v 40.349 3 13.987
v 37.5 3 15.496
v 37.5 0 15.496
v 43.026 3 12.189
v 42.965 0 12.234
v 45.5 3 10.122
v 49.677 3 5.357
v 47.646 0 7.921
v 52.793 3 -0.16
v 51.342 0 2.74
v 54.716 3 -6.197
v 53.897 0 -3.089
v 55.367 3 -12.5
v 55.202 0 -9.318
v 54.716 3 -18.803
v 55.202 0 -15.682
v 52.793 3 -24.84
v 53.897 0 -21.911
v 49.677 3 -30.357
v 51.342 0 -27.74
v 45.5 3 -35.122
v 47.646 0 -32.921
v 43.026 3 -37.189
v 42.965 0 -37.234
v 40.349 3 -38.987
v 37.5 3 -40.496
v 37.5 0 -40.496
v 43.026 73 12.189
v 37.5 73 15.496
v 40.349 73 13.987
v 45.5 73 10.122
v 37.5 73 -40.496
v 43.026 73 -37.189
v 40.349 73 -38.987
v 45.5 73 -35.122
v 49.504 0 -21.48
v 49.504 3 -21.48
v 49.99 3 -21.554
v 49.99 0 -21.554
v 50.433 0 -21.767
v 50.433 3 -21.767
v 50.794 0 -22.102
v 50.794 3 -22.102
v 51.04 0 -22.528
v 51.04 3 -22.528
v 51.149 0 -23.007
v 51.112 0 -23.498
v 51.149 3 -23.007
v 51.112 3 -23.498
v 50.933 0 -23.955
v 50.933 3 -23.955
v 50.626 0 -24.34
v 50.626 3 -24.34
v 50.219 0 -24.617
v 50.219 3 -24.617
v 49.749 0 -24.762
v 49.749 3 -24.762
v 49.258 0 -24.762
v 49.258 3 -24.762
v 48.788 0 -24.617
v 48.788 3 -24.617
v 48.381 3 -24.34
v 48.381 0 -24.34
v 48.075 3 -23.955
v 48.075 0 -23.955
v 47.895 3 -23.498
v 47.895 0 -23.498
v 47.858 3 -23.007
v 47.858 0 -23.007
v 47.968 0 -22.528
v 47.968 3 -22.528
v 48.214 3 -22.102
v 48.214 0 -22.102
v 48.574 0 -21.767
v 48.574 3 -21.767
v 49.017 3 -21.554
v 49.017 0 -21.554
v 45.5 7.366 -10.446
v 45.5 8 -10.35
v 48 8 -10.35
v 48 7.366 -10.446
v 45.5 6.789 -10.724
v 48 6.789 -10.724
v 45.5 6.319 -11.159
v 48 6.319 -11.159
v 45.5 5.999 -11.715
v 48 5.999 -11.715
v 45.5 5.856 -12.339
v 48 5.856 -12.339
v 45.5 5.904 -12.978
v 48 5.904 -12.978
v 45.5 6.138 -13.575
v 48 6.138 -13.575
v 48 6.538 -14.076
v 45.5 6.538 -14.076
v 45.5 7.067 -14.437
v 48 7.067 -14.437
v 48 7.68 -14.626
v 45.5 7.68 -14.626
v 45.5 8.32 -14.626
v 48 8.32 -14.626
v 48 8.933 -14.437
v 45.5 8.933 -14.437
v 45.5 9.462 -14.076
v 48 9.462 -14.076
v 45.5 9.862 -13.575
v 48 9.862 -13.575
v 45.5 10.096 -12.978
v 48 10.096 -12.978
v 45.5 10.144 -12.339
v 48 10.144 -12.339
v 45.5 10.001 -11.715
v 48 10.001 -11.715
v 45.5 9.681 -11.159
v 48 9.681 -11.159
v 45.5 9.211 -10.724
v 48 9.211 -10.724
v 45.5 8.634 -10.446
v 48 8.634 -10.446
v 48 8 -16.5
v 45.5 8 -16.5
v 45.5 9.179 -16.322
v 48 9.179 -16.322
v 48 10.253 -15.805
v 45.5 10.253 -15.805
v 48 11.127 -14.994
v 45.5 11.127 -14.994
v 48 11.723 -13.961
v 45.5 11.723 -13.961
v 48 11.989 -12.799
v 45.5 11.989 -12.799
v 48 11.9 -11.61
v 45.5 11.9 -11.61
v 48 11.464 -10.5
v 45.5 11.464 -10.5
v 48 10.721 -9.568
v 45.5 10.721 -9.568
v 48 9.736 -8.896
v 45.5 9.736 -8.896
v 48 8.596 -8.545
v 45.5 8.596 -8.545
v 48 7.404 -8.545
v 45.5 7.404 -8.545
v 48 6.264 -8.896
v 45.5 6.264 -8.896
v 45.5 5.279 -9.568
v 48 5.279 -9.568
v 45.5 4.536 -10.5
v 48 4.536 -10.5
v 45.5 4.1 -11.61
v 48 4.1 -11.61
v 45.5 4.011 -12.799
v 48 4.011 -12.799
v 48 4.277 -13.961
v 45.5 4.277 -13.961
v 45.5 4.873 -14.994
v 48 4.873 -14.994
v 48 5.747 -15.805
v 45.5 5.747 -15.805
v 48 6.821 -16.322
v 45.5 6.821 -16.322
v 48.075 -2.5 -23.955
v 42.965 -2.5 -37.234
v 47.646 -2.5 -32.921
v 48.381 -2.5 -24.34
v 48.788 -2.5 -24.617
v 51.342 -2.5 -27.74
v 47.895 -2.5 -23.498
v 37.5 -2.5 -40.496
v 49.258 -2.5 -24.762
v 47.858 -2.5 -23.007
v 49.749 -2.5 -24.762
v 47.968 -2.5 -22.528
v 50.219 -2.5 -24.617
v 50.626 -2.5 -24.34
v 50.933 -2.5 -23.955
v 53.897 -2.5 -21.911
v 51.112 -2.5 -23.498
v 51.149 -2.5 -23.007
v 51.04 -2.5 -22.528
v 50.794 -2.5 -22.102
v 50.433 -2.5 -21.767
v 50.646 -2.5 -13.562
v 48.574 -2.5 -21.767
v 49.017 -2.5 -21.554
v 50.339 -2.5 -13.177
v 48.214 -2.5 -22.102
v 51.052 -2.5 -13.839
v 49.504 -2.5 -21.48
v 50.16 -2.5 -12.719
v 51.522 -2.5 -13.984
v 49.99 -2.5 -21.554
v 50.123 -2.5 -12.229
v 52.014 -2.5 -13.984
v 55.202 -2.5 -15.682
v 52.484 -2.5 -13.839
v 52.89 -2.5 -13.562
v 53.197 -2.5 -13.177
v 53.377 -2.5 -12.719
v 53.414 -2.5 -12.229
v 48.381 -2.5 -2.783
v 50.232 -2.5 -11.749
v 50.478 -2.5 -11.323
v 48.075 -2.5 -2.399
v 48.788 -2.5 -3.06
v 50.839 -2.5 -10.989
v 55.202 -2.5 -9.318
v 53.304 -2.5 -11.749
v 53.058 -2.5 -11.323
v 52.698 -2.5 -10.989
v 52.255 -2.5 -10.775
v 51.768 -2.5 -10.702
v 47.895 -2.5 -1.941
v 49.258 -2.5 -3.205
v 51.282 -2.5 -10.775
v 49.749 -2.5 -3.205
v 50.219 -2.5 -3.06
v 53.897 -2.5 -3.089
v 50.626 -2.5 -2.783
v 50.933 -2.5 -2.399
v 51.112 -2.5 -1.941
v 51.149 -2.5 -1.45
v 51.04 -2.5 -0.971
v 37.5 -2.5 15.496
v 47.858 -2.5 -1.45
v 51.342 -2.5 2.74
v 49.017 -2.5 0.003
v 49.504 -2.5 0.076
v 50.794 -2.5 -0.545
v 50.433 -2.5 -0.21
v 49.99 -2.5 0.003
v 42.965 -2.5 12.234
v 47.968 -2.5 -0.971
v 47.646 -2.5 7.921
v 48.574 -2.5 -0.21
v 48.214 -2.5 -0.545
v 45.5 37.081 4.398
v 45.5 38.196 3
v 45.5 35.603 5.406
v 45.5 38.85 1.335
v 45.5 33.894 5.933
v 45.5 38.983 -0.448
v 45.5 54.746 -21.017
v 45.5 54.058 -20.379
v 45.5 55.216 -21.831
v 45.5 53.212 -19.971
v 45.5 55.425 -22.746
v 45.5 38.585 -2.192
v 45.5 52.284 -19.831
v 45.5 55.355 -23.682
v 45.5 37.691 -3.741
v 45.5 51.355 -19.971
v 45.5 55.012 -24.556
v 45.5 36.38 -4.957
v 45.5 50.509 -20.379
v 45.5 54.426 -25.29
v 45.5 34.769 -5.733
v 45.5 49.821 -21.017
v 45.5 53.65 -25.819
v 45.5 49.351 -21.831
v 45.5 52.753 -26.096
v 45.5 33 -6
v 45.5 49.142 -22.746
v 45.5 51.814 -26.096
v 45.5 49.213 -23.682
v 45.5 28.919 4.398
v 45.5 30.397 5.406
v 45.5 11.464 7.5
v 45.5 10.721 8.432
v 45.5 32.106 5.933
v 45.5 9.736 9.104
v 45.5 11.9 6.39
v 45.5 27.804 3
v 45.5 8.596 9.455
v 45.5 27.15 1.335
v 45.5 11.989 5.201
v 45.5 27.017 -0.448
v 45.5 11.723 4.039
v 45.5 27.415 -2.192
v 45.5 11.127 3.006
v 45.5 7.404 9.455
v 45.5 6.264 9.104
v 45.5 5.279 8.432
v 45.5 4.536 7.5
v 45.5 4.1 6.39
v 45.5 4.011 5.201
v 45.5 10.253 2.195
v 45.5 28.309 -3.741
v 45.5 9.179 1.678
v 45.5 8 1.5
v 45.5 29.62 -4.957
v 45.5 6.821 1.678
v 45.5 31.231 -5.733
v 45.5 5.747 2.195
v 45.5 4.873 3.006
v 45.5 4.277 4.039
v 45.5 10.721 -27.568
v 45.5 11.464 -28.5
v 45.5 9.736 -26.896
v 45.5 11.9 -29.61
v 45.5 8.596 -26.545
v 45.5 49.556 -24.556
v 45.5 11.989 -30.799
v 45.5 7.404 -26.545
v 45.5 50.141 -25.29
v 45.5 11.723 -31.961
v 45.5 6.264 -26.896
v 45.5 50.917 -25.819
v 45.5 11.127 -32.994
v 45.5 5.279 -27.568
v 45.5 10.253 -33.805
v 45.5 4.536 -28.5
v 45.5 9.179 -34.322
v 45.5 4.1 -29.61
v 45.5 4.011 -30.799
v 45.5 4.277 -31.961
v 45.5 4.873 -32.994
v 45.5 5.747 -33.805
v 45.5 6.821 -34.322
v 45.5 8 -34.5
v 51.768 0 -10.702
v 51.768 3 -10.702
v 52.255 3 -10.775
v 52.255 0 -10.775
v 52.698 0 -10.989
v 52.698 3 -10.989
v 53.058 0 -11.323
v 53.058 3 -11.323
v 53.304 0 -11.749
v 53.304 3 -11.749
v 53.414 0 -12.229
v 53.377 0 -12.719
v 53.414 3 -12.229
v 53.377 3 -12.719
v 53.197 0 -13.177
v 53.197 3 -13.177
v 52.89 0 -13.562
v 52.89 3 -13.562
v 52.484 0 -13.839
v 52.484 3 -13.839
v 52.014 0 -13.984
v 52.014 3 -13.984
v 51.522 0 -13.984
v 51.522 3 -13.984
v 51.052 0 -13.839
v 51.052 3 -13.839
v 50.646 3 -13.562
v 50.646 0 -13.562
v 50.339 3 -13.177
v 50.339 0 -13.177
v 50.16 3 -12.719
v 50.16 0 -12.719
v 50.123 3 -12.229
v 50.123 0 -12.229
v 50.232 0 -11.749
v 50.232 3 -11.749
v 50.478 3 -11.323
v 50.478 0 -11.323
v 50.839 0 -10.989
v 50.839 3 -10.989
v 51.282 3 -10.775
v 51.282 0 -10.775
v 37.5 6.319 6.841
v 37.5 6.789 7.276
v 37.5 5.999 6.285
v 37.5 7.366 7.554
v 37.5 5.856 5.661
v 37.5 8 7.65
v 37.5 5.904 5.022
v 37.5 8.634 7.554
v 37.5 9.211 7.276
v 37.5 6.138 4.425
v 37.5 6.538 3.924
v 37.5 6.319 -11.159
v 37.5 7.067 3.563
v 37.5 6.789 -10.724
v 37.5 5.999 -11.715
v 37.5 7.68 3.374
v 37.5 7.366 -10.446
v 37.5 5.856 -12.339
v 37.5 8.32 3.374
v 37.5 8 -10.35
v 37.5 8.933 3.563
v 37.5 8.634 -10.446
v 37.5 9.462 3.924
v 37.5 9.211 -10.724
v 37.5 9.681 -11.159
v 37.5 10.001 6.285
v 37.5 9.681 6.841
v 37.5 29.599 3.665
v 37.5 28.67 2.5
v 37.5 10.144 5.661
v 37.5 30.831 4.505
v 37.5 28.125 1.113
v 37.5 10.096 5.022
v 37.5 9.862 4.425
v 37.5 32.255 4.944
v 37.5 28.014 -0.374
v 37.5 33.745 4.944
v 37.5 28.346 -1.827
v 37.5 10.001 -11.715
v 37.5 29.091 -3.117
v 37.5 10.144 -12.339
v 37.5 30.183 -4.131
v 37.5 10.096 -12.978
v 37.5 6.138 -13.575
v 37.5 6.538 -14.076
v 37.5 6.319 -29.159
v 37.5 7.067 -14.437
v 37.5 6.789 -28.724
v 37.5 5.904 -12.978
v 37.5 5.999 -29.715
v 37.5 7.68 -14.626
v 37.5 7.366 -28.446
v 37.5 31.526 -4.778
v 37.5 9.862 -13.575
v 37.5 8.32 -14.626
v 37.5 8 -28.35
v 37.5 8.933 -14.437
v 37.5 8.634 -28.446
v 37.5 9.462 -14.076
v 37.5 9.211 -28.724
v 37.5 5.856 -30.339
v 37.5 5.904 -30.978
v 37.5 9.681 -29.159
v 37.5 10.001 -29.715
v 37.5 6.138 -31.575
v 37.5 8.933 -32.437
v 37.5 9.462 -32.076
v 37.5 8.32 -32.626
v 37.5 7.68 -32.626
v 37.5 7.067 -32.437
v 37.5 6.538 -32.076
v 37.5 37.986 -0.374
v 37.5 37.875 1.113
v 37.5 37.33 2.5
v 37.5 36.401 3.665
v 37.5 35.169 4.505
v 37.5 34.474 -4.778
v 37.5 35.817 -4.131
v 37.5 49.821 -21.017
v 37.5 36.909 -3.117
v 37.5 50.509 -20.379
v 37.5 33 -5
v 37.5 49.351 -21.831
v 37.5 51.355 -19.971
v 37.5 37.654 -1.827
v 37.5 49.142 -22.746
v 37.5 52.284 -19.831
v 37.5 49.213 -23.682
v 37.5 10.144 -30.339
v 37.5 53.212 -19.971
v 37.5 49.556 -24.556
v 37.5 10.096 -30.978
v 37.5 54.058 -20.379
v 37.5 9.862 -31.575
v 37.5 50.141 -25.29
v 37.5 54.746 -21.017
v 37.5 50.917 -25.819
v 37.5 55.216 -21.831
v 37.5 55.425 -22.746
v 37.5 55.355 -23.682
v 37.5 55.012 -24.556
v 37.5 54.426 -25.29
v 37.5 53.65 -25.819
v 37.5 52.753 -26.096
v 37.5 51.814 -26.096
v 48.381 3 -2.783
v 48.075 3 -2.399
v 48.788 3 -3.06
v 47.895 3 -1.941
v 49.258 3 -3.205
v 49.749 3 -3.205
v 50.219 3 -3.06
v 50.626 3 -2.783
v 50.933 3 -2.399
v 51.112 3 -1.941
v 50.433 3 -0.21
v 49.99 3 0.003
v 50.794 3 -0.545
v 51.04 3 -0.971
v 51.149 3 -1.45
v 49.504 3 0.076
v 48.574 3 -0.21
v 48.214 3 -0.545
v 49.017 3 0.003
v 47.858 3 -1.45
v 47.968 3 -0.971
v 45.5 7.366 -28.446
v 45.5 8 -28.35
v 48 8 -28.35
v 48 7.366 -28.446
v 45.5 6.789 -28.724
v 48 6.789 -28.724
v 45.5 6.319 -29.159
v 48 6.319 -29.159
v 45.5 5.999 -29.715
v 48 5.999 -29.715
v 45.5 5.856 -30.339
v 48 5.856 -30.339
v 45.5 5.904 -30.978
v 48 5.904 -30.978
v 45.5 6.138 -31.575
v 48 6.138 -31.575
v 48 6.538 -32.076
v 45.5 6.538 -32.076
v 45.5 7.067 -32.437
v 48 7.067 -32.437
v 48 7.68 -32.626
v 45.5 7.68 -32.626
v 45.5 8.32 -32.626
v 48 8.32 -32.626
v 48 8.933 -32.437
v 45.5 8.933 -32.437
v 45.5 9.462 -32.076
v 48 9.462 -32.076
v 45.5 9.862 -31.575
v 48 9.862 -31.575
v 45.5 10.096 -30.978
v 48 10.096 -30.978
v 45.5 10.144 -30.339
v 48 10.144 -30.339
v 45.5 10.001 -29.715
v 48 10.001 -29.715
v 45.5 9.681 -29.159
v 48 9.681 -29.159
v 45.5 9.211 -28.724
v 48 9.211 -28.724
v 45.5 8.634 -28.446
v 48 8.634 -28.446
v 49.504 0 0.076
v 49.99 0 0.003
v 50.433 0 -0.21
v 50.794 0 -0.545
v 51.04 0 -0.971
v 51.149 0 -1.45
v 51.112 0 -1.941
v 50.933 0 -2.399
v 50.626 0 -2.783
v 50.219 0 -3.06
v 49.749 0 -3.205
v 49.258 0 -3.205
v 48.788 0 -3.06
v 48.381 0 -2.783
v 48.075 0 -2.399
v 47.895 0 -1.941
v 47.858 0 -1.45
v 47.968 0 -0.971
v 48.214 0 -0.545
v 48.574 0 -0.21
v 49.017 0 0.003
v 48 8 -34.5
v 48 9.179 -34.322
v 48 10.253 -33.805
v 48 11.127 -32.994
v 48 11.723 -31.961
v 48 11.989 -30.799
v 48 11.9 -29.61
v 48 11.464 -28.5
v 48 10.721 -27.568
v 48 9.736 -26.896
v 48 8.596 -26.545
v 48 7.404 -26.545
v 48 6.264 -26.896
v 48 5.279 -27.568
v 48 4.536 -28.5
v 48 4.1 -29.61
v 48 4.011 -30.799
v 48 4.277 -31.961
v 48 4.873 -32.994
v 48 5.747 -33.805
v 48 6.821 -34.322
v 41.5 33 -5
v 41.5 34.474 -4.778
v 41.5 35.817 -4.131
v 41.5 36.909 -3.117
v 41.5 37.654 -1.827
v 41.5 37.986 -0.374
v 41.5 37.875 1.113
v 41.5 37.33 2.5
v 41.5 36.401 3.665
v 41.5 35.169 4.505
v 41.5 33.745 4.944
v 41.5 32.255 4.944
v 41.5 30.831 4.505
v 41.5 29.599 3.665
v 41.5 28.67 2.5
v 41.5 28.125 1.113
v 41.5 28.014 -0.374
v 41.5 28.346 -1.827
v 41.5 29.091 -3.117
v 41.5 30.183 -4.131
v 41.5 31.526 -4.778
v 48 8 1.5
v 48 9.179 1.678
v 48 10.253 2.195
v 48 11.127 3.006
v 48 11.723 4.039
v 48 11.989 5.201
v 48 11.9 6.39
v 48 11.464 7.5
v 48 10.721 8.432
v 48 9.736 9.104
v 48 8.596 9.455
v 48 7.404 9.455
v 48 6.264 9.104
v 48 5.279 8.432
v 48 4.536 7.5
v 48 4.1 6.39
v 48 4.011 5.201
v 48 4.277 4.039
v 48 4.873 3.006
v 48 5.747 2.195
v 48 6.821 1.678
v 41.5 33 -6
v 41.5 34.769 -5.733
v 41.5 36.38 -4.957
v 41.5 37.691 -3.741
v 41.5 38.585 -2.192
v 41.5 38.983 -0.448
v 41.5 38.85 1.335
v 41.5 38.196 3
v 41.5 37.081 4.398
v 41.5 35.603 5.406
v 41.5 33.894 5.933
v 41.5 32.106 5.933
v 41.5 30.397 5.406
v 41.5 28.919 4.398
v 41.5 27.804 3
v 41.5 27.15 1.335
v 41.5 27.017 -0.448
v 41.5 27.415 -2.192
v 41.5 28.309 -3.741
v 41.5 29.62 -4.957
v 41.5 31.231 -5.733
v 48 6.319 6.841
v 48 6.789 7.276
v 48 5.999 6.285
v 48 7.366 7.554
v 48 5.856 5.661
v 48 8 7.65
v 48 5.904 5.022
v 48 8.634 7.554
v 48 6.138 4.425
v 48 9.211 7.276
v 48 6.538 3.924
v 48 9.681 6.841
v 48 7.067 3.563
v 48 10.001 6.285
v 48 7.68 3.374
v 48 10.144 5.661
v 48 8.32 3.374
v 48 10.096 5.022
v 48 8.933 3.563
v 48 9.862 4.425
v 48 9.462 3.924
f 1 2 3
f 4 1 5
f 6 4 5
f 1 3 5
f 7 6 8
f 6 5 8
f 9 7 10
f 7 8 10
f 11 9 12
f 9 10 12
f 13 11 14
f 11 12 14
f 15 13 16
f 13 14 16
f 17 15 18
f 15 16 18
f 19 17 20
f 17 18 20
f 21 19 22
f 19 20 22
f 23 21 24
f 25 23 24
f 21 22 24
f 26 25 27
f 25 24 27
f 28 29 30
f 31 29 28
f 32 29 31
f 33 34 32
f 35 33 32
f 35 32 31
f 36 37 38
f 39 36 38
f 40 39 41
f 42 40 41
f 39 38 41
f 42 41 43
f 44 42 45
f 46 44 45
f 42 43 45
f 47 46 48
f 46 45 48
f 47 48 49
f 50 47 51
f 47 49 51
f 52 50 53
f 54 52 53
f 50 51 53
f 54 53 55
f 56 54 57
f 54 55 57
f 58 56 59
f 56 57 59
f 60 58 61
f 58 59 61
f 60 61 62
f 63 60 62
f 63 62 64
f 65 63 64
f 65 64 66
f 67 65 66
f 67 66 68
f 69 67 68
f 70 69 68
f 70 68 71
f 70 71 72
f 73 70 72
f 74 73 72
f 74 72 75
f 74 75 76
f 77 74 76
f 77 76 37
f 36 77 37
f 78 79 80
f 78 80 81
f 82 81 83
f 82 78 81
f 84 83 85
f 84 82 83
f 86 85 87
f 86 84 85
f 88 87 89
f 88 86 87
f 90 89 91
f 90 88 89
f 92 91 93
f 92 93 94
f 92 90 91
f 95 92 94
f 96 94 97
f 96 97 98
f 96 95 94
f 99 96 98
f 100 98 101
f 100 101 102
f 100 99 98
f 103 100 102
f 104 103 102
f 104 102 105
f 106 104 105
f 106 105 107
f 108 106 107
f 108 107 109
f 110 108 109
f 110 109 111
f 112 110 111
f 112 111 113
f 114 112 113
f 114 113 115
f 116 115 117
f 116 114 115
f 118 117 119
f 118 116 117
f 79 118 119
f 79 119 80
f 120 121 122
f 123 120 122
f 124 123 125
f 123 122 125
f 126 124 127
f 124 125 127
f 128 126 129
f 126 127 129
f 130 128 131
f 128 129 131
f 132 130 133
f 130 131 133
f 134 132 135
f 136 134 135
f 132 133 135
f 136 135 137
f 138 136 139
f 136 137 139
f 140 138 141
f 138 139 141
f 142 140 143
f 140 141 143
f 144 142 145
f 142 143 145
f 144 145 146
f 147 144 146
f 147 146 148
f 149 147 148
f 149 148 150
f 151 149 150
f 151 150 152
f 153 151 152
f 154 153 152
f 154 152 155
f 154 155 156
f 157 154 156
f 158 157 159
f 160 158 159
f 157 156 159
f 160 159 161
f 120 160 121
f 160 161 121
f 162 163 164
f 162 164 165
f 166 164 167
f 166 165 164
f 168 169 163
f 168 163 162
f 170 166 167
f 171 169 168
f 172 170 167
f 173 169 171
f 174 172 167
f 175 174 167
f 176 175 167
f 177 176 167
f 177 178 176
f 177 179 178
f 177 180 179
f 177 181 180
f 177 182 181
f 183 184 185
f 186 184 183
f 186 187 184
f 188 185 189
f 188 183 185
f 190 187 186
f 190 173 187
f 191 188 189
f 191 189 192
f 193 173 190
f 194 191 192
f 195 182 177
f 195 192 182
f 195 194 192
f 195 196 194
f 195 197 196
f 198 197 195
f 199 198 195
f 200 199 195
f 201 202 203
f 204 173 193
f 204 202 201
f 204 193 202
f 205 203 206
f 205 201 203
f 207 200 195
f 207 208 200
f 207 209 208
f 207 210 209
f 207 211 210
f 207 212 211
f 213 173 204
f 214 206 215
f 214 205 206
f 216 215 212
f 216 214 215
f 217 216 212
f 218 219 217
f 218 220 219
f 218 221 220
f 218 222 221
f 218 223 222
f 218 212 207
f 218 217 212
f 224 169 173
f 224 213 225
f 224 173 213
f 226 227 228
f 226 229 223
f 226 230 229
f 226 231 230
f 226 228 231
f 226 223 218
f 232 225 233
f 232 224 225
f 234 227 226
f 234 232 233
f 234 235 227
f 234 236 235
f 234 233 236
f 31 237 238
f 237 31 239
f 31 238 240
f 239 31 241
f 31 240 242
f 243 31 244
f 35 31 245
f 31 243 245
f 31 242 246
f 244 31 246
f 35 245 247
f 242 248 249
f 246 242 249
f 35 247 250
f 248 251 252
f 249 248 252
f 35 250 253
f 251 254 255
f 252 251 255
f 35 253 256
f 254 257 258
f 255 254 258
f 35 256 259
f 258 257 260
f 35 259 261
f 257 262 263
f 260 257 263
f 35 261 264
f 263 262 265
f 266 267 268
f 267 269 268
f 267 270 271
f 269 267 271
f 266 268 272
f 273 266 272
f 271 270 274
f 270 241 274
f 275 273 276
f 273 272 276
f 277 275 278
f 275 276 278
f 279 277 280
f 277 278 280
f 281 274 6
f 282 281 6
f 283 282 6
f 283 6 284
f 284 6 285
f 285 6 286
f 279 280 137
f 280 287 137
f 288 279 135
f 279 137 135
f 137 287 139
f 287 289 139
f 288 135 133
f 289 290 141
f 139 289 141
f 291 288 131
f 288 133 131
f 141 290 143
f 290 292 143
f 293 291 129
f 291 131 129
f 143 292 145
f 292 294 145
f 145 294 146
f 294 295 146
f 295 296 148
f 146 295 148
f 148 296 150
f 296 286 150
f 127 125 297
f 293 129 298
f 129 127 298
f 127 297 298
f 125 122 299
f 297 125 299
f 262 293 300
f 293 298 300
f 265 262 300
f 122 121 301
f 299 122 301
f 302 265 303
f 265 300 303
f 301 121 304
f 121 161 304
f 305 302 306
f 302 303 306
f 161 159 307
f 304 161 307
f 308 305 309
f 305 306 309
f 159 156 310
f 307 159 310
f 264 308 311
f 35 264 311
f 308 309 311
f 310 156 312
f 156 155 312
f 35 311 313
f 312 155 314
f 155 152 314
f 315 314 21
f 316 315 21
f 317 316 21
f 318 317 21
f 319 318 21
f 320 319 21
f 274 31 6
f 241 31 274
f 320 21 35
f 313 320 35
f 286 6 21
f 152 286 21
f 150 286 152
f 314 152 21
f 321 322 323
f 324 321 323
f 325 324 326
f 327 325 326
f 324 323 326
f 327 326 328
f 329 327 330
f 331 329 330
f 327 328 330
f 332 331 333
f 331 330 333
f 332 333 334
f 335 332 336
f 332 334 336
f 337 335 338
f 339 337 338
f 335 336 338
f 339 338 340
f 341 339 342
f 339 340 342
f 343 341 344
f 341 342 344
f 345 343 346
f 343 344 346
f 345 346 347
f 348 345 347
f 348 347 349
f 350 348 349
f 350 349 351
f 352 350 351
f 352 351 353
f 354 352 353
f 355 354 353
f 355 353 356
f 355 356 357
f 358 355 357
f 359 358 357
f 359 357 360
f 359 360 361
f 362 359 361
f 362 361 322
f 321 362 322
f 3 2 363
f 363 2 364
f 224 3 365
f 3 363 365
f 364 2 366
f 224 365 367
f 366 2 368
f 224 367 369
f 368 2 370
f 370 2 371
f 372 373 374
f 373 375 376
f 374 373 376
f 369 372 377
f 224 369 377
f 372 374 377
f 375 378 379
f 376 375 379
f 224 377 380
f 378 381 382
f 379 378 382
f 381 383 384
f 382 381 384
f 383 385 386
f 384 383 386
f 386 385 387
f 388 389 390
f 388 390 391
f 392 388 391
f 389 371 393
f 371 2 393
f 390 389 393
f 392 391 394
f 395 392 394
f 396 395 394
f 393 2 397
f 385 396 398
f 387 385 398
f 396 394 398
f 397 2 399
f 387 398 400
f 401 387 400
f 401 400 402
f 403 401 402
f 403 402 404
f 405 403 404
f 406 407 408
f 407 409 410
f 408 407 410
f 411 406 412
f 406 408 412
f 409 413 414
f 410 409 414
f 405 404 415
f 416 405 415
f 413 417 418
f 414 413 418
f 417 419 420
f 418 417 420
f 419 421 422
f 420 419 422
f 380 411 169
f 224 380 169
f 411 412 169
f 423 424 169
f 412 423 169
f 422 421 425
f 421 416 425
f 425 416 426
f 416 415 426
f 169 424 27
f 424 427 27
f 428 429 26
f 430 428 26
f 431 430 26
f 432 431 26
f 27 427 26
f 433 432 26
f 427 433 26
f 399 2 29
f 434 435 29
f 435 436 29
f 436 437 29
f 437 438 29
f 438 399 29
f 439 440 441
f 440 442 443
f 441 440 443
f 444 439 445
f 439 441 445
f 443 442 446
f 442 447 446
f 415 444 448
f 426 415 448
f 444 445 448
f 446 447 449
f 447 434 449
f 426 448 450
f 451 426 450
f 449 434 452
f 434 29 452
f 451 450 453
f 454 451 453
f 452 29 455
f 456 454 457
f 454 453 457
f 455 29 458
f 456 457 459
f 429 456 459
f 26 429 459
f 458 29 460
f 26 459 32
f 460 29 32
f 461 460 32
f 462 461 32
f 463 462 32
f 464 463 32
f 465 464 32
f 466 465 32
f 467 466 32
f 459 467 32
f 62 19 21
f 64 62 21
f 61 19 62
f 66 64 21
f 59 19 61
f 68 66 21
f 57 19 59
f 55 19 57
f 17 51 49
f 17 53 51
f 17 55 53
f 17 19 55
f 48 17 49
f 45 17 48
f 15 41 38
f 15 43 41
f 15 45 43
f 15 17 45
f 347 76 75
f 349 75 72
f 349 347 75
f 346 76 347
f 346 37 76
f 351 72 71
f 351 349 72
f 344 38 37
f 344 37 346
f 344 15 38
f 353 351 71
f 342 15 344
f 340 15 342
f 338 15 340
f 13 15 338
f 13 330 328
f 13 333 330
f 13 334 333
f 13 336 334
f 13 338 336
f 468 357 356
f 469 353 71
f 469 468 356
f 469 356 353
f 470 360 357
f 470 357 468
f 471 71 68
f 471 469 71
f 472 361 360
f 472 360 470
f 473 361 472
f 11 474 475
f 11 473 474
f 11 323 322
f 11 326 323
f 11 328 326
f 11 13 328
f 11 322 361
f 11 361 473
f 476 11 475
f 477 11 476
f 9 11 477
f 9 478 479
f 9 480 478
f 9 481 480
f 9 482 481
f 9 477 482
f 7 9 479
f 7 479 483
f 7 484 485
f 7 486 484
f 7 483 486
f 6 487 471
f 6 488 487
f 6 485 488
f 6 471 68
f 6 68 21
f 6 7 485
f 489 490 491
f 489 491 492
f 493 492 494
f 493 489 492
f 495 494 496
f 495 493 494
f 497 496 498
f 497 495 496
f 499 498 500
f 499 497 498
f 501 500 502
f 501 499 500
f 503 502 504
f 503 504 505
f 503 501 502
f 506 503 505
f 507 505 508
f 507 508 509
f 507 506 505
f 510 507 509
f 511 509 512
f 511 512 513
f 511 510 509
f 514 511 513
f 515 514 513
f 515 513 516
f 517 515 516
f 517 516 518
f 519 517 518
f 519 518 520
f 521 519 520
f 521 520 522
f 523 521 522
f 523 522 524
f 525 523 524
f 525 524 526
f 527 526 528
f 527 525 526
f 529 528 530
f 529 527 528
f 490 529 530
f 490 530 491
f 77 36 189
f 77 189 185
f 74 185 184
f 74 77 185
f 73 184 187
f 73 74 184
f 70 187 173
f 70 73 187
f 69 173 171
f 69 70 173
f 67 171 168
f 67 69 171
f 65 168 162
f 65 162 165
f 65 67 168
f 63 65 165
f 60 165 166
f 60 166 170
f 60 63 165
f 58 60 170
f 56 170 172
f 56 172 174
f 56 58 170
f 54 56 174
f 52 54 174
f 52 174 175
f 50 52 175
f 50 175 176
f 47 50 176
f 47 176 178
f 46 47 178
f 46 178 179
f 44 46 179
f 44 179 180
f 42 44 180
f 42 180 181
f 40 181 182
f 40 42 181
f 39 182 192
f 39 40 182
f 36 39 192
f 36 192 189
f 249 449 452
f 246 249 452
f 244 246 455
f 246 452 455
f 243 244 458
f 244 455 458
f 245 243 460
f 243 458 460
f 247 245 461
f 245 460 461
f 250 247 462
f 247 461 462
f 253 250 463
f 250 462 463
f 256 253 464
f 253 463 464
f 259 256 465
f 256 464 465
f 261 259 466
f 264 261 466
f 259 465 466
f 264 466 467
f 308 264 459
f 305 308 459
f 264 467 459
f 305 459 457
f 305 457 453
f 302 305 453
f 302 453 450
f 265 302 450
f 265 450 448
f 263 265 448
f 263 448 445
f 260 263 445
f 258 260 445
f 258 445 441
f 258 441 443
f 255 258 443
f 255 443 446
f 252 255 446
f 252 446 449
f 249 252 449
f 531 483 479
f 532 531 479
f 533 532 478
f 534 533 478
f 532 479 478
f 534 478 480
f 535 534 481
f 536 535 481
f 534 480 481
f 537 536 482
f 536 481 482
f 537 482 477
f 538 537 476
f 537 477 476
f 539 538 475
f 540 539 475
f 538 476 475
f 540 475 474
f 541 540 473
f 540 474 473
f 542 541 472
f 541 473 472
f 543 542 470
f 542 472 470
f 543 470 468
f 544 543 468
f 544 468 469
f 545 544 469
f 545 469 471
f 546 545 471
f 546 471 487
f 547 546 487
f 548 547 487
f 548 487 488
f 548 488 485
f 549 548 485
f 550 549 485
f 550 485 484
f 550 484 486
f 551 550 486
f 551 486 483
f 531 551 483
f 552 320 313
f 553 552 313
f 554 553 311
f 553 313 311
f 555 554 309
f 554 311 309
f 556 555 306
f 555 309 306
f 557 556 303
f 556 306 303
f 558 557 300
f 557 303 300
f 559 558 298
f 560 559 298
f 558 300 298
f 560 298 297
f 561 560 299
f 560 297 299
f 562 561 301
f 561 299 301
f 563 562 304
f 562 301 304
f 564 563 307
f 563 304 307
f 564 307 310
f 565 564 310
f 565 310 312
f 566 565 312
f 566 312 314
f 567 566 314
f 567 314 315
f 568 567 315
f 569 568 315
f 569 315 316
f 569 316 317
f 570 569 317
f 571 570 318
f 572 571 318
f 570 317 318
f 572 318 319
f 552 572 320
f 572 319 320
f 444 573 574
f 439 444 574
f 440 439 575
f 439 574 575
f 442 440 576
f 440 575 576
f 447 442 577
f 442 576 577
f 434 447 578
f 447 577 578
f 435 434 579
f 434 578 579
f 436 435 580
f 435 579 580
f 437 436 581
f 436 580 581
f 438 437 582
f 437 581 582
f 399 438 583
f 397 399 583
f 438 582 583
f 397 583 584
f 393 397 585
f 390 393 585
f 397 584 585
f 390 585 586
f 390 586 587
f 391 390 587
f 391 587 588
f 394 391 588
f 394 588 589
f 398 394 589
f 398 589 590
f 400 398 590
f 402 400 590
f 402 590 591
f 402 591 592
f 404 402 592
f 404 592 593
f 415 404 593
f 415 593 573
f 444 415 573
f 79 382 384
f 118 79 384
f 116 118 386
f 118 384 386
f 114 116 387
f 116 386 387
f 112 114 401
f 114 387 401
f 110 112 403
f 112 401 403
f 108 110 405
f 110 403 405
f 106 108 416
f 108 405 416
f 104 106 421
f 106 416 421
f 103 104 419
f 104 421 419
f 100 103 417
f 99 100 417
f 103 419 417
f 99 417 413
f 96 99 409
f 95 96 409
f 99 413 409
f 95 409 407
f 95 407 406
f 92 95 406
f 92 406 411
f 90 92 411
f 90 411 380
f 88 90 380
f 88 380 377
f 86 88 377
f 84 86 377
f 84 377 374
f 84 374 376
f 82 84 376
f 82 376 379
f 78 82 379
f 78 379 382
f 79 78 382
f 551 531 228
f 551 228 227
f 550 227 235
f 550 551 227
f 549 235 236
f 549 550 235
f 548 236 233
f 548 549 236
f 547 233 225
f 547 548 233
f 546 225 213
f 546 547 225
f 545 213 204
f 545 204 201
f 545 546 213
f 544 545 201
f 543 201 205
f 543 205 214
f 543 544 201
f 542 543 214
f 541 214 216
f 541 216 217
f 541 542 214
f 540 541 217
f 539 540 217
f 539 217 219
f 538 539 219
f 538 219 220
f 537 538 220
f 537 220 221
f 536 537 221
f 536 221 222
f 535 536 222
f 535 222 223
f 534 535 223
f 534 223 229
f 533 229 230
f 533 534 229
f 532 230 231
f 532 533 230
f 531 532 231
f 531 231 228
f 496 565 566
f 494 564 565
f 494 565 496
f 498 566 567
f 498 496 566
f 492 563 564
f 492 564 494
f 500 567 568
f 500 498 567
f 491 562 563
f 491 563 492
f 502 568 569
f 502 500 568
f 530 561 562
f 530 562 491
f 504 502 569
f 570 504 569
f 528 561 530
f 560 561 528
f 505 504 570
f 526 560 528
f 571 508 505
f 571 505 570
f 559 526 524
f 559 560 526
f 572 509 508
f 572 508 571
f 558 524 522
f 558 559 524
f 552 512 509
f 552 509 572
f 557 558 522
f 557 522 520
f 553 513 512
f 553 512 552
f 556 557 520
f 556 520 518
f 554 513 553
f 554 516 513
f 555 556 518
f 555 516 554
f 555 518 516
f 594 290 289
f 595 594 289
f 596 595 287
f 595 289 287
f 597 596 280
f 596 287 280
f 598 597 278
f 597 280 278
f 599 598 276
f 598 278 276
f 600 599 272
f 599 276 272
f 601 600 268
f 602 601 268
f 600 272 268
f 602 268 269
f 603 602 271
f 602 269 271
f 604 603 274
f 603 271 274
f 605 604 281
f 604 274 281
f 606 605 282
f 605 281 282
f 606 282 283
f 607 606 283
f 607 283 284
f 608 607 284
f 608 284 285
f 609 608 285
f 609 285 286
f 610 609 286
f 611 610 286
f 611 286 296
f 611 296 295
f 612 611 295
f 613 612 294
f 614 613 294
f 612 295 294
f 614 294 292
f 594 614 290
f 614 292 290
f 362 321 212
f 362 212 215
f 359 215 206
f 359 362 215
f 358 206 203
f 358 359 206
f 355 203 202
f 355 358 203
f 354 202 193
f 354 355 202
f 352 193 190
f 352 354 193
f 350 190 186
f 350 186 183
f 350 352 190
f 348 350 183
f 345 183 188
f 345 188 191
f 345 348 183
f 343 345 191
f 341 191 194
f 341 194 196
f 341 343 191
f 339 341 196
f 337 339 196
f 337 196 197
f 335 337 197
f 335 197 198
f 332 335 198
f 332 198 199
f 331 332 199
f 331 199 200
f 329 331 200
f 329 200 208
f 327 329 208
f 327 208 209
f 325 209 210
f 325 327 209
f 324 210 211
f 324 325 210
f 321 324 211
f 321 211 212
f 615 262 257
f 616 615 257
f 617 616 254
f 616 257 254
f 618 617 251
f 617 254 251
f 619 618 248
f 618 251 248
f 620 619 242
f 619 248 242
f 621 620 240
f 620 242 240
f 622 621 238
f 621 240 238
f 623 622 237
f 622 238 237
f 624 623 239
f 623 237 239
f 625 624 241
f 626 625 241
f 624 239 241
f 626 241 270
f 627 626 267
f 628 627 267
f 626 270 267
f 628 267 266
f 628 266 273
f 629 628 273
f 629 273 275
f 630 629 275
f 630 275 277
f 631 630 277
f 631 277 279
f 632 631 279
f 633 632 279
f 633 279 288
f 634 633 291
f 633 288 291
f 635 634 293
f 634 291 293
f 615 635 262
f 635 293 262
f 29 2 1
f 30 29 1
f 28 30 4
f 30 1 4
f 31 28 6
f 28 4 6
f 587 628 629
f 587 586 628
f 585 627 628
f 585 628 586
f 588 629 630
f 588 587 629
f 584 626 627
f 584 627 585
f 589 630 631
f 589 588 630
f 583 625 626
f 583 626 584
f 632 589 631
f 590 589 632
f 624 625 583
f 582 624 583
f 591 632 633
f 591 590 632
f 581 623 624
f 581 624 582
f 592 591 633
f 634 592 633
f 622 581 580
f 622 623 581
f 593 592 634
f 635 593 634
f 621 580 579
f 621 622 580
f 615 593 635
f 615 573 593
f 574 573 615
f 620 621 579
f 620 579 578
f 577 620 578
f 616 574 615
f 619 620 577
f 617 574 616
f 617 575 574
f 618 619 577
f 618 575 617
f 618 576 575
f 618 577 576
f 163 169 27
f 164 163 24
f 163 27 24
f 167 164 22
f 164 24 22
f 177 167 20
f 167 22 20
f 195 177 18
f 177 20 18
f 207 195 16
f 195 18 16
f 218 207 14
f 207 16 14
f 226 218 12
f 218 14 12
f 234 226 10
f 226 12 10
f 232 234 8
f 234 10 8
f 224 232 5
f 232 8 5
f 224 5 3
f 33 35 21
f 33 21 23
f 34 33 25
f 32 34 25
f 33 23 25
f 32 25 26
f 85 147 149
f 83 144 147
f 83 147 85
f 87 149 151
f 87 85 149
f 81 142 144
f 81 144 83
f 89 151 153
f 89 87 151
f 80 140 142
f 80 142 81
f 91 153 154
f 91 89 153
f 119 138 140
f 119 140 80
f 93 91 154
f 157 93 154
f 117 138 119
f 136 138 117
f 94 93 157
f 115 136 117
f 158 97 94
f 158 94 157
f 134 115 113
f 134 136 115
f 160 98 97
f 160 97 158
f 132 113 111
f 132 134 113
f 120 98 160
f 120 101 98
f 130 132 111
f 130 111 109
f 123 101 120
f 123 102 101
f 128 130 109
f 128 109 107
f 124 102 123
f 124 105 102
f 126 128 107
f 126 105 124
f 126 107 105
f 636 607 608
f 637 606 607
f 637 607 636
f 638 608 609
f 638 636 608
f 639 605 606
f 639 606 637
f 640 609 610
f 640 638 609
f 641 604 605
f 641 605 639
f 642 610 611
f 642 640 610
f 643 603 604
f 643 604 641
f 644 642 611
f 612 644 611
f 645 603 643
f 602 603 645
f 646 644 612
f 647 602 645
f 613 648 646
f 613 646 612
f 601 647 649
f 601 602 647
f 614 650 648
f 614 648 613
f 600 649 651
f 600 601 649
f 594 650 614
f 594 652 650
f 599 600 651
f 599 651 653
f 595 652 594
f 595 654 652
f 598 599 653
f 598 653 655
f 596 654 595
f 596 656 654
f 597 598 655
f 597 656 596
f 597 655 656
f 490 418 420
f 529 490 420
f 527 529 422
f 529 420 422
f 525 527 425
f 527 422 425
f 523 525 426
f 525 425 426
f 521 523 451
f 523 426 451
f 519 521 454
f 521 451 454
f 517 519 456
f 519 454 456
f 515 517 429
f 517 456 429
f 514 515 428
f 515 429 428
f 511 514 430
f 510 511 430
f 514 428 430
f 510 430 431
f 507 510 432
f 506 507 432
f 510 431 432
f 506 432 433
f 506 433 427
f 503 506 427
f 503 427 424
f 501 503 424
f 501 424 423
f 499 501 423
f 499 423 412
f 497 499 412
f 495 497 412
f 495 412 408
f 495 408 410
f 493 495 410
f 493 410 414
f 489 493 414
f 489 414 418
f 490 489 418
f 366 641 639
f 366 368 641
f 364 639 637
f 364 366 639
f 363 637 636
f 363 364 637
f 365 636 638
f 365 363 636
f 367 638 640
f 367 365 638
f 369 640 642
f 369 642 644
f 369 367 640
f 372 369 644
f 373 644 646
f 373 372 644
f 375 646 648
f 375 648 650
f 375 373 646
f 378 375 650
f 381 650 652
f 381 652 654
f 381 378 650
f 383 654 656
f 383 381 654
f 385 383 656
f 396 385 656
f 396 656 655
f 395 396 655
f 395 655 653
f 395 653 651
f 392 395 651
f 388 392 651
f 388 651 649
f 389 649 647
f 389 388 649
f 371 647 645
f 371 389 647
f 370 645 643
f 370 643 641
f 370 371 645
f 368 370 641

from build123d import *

# Parameters (mm, degrees)
SKETCH1_R                = 28
BOSS_EXTRUDE1_DEPTH      = 3
SKETCH2_R                = 1.625
CUT_EXTRUDE1_DEPTH       = 3
BOSS_EXTRUDE4_START      = 3
BOSS_EXTRUDE4_OUTLINE_R  = 1.625
BOSS_EXTRUDE4_DEPTH      = 70
BOSS_EXTRUDE6_DEPTH      = 7
CUT_EXTRUDE13_START      = -10
CUT_EXTRUDE13_DEPTH      = 10
SKETCH14_R               = 6
CUT_EXTRUDE7_DEPTH       = 4
SKETCH15_R               = 5
CUT_EXTRUDE8_DEPTH       = 37
SKETCH17_R               = 2.15
CUT_EXTRUDE10_DEPTH      = 15.8
CUT_EXTRUDE11_DEPTH      = 5
CUT_EXTRUDE12_START      = -3
CUT_EXTRUDE12_DEPTH      = 3
SKETCH21_W               = 20.621892052
SKETCH21_H               = 10
BOSS_EXTRUDE7_DEPTH      = 7
SKETCH23_R               = 2.15
CUT_EXTRUDE17_DEPTH      = 23
SKETCH25_W               = 2
SKETCH25_H               = 4.7
CUT_EXTRUDE19_DEPTH      = 5
SKETCH26_W               = 20.621892052
SKETCH26_H               = 58
CUT_EXTRUDE21_DEPTH      = 5
CUT_EXTRUDE22_DEPTH      = 5
SKETCH41_R               = 1.625
CUT_EXTRUDE23_DEPTH      = 70
CUT_EXTRUDE24_START      = -39
CUT_EXTRUDE24_DEPTH      = 39
BOSS_EXTRUDE12_START     = -3
SKETCH43_R               = 30.866648668
BOSS_EXTRUDE12_DEPTH     = 3
BOSS_EXTRUDE13_DEPTH     = 70
BOSS_EXTRUDE14_DEPTH     = 70
SKETCH47_R               = 1.625
SKETCH47_R_2             = 1.65
CUT_EXTRUDE26_DEPTH      = 39
SKETCH48_R               = 3.15
CUT_EXTRUDE27_DEPTH      = 39
SKETCH49_R               = 5
CUT_EXTRUDE28_DEPTH      = 10
SKETCH50_R               = 6
CUT_EXTRUDE29_DEPTH      = 4
SKETCH51_R               = 3
CUT_EXTRUDE30_DEPTH      = 2.5
CUT_EXTRUDE31_DEPTH      = 82
CUT_EXTRUDE31_DEPTH_BACK = 10
SKETCH53_R               = 2.15
CUT_EXTRUDE32_DEPTH      = 10
SKETCH54_R               = 4
SKETCH54_R_2             = 2.15
BOSS_EXTRUDE15_DEPTH     = 2.5
SKETCH55_R               = 1.65
BOSS_EXTRUDE16_DEPTH     = 2.5


# Read off the part's stored shape, not the designer's step: Boss-Extrude4, Cut-Extrude13
with BuildPart() as part:
    # Sketch1 → Boss-Extrude1 (new body)
    with BuildSketch(Plane(origin=(0, 0, 0), x_dir=(1, 0, 0), z_dir=(0, 1, 0))):
        with Locations(Location((20, 12.5, 0), (0, 0, 270))):
            Circle(SKETCH1_R)
    extrude(amount=BOSS_EXTRUDE1_DEPTH)

    # Sketch2 → Cut-Extrude1 (cut)
    with BuildSketch(Plane(origin=(0, 3, 0), x_dir=(1, 0, 0), z_dir=(0, 1, 0))):
        with Locations(Location((20, 19.5, 0), (0, 0, 270))):
            Circle(SKETCH2_R)
        with Locations(Location((20, 5.5, 0), (0, 0, 270))):
            Circle(SKETCH2_R)
        with Locations(Location((20, 12.5, 0), (0, 0, 270))):
            Circle(SKETCH2_R)
    extrude(amount=-CUT_EXTRUDE1_DEPTH, mode=Mode.SUBTRACT)

    # Boss-Extrude4 outline → Boss-Extrude4 (add)
    with BuildSketch(Plane(origin=(0, 0, 0), x_dir=(1, 0, 0), z_dir=(0, 1, 0)).offset(BOSS_EXTRUDE4_START)):
        with BuildLine():
            ThreePointArc((3.5, -10.121892052), (48, 12.5), (3.5, 35.121892052))
            Line((3.5, 35.121892052), (3.5, -10.121892052))
        make_face()
        with Locations((20, 5.5)):
            Circle(BOSS_EXTRUDE4_OUTLINE_R, mode=Mode.SUBTRACT)
        with Locations((20, 12.5)):
            Circle(BOSS_EXTRUDE4_OUTLINE_R, mode=Mode.SUBTRACT)
        with Locations((20, 19.5)):
            Circle(BOSS_EXTRUDE4_OUTLINE_R, mode=Mode.SUBTRACT)
    extrude(amount=BOSS_EXTRUDE4_DEPTH)

    # Sketch13 → Boss-Extrude6 (add)
    with BuildSketch(Plane.ZY.offset(-3.5)):
        Polygon((-10, 23), (10, 23), (10.121892052, 23), (10.121892052, 15), (10, 15), (-10, 15), (-10.5, 15), (-10.5, 23), align=None)
    extrude(amount=BOSS_EXTRUDE6_DEPTH)

    # Cut-Extrude13 outline → Cut-Extrude13 (cut)
    with BuildSketch(Plane.ZY.offset(-3.5).offset(CUT_EXTRUDE13_START)):
        with BuildLine():
            Line((-10.5, 33), (-10.5, 23))
            Line((-10.5, 23), (10.121892052, 23))
            Line((10.121892052, 23), (10.121892052, 35.792364821))
            ThreePointArc((10.121892052, 35.792364821), (-1.408923961, 43.405043646), (-10.5, 33))
        make_face()
    extrude(amount=CUT_EXTRUDE13_DEPTH, mode=Mode.SUBTRACT)

    # Sketch14 → Cut-Extrude7 (cut)
    with BuildSketch(Plane.ZY.offset(-3.5)):
        with Locations((-22.981333294, 52.283628291)):
            Circle(SKETCH14_R)
    extrude(amount=-CUT_EXTRUDE7_DEPTH, mode=Mode.SUBTRACT)

    # Sketch15 → Cut-Extrude8 (cut)
    with BuildSketch(Plane.ZY.offset(-7.5)):
        with Locations((-22.981333294, 52.283628291)):
            Circle(SKETCH15_R)
    extrude(amount=-CUT_EXTRUDE8_DEPTH, mode=Mode.SUBTRACT)

    # Sketch17 → Cut-Extrude10 (cut)
    with BuildSketch(Plane.ZY.offset(3.5)):
        with Locations((-5, 18.2)):
            Circle(SKETCH17_R)
        with Locations((5, 18.2)):
            Circle(SKETCH17_R)
    extrude(amount=-CUT_EXTRUDE10_DEPTH, mode=Mode.SUBTRACT)

    # Sketch18 → Cut-Extrude11 (cut)
    with BuildSketch(Plane.ZY.offset(3.5)):
        Polygon((-0.189053974, 23), (1, 23), (1, 18), (-1, 18), (-1, 23), align=None)
    extrude(amount=-CUT_EXTRUDE11_DEPTH, mode=Mode.SUBTRACT)

    # Sketch19 → Cut-Extrude12 (cut)
    with BuildSketch(Plane.ZY.offset(-3.5).offset(CUT_EXTRUDE12_START)):
        with BuildLine():
            Line((10.121892052, 63), (10.121892052, 35.792364821))
            ThreePointArc((10.121892052, 35.792364821), (-1.408923961, 43.405043646), (-10.5, 33))
            Line((-10.5, 33), (-10.5, 62))
            Line((-10.5, 62), (-10.5, 63))
            Line((-10.5, 63), (10.121892052, 63))
        make_face()
    extrude(amount=CUT_EXTRUDE12_DEPTH, mode=Mode.SUBTRACT)

    # Sketch21 → Boss-Extrude7 (add)
    with BuildSketch(Plane.ZY.offset(-3.5)):
        with Locations((-0.189053974, 68)):
            Rectangle(SKETCH21_W, SKETCH21_H)
    extrude(amount=BOSS_EXTRUDE7_DEPTH)

    # Sketch23 → Cut-Extrude17 (cut)
    with BuildSketch(Plane.ZY.offset(3.5)):
        with Locations((-5, 67.7)):
            Circle(SKETCH23_R)
        with Locations((5, 67.7)):
            Circle(SKETCH23_R)
    extrude(amount=-CUT_EXTRUDE17_DEPTH, mode=Mode.SUBTRACT)

    # Sketch25 → Cut-Extrude19 (cut)
    with BuildSketch(Plane.ZY.offset(3.5)):
        with Locations((0, 65.35)):
            Rectangle(SKETCH25_W, SKETCH25_H)
    extrude(amount=-CUT_EXTRUDE19_DEPTH, mode=Mode.SUBTRACT)

    # Sketch26 → Cut-Extrude21 (cut)
    with BuildSketch(Plane.ZY.offset(3.5)):
        with Locations((-0.189053974, 44)):
            Rectangle(SKETCH26_W, SKETCH26_H)
    extrude(amount=-CUT_EXTRUDE21_DEPTH, mode=Mode.SUBTRACT)

    # Sketch27 → Cut-Extrude22 (cut)
    with BuildSketch(Plane.ZY.offset(-6.5)):
        Polygon((10.121892052, 63), (-10.5, 63), (-10.5, 33), (10.121892052, 35.792364821), align=None)
    extrude(amount=-CUT_EXTRUDE22_DEPTH, mode=Mode.SUBTRACT)

    # Sketch41 → Cut-Extrude23 (cut)
    with BuildSketch(Plane(origin=(0, 73, 0), x_dir=(1, 0, 0), z_dir=(0, 1, 0))):
        with BuildLine():
            Line((11.5, 39.178643144), (11.5, 10.5))
            Line((11.5, 10.5), (11.5, -14.178643144))
            ThreePointArc((11.5, -14.178643144), (48, 12.5), (11.5, 39.178643144))
        make_face()
        with Locations(Location((20, 5.5, 0), (0, 0, 270))):
            Circle(SKETCH41_R, mode=Mode.SUBTRACT)
        with Locations(Location((20, 12.5, 0), (0, 0, 270))):
            Circle(SKETCH41_R, mode=Mode.SUBTRACT)
        with Locations(Location((20, 19.5, 0), (0, 0, 270))):
            Circle(SKETCH41_R, mode=Mode.SUBTRACT)
    extrude(amount=-CUT_EXTRUDE23_DEPTH, mode=Mode.SUBTRACT)

    # Sketch42 → Cut-Extrude24 (cut)
    with BuildSketch(Plane(origin=(0, 3, 0), x_dir=(1, 0, 0), z_dir=(0, 1, 0)).offset(CUT_EXTRUDE24_START)):
        with BuildLine():
            ThreePointArc((3.5, 35.121892052), (-6.366648668, 12.5), (3.5, -10.121892052))
            ThreePointArc((3.5, -10.121892052), (-8, 12.5), (3.5, 35.121892052))
        make_face()
    extrude(amount=CUT_EXTRUDE24_DEPTH, mode=Mode.SUBTRACT)

    # Sketch43 → Boss-Extrude12 (add)
    with BuildSketch(Plane(origin=(0, 3, 0), x_dir=(1, 0, 0), z_dir=(0, 1, 0)).offset(BOSS_EXTRUDE12_START)):
        with Locations(Location((24.5, 12.5, 0), (0, 0, 270))):
            Circle(SKETCH43_R)
    extrude(amount=BOSS_EXTRUDE12_DEPTH)

    # Sketch45 → Boss-Extrude13 (add)
    with BuildSketch(Plane(origin=(0, 3, 0), x_dir=(1, 0, 0), z_dir=(0, 1, 0))):
        with BuildLine():
            Line((11.5, 40.495535358), (11.5, 39.178643144))
            ThreePointArc((11.5, 39.178643144), (7.336497035, 37.472698946), (3.5, 35.121892052))
            ThreePointArc((3.5, 35.121892052), (7.288985777, 38.12286068), (11.5, 40.495535358))
        make_face()
        with BuildLine():
            Line((11.5, -14.178643144), (11.5, -15.495535358))
            ThreePointArc((11.5, -15.495535358), (7.288985777, -13.12286068), (3.5, -10.121892052))
            ThreePointArc((3.5, -10.121892052), (7.336497035, -12.472698946), (11.5, -14.178643144))
        make_face()
    extrude(amount=BOSS_EXTRUDE13_DEPTH)

    # Sketch46 → Boss-Extrude14 (add)
    with BuildSketch(Plane(origin=(0, 3, 0), x_dir=(1, 0, 0), z_dir=(0, 1, 0))):
        with BuildLine():
            Line((37.5, 40.495535358), (37.5, 12.5))
            Line((37.5, 12.5), (37.5, -15.495535358))
            ThreePointArc((37.5, -15.495535358), (41.711014223, -13.12286068), (45.5, -10.121892052))
            Line((45.5, -10.121892052), (45.5, 12.5))
            Line((45.5, 12.5), (45.5, 35.121892052))
            ThreePointArc((45.5, 35.121892052), (41.711014223, 38.12286068), (37.5, 40.495535358))
        make_face()
    extrude(amount=BOSS_EXTRUDE14_DEPTH)

    # Sketch47 → Cut-Extrude26 (cut)
    with BuildSketch(Plane(origin=(0, 3, 0), x_dir=(1, 0, 0), z_dir=(0, 1, 0))):
        with Locations(Location((24.638783134, 19.352080003, 0), (0, 0, 270))):
            Circle(SKETCH47_R)
        with Locations(Location((24.638783134, 12.352080003, 0), (0, 0, 270))):
            Circle(SKETCH47_R)
        with Locations(Location((24.638783134, -15.204594071, 0), (0, 0, 270))):
            Circle(SKETCH47_R)
        with Locations(Location((0.774003343, -1.426257034, 0), (0, 0, 270))):
            Circle(SKETCH47_R)
        with Locations(Location((0.774003343, 26.13041704, 0), (0, 0, 270))):
            Circle(SKETCH47_R)
        with Locations(Location((24.638783134, 39.908754076, 0), (0, 0, 270))):
            Circle(SKETCH47_R)
        with Locations(Location((30.700960961, 15.852080003, 0), (0, 0, 270))):
            Circle(SKETCH47_R)
        with Locations(Location((-2.490624188, 12.352080003, 0), (0, 0, 270))):
            Circle(SKETCH47_R)
        with Locations(Location((51.768190456, 12.352080003, 0), (0, 0, 270))):
            Circle(SKETCH47_R_2)
        with Locations(Location((24.638783134, 26.13041704, 0), (0, 0, 270))):
            Circle(SKETCH47_R)
        with Locations(Location((24.638783134, -1.426257034, 0), (0, 0, 270))):
            Circle(SKETCH47_R)
        with Locations(Location((30.700960961, 8.852080003, 0), (0, 0, 270))):
            Circle(SKETCH47_R)
        with Locations(Location((24.638783134, 5.352080003, 0), (0, 0, 270))):
            Circle(SKETCH47_R)
        with Locations(Location((18.576605308, 8.852080003, 0), (0, 0, 270))):
            Circle(SKETCH47_R)
        with Locations(Location((18.576605308, 15.852080003, 0), (0, 0, 270))):
            Circle(SKETCH47_R)
        with Locations(Location((49.503562926, 1.573742966, 0), (0, 0, 270))):
            Circle(SKETCH47_R_2)
        with Locations(Location((49.503562926, 23.13041704, 0), (0, 0, 270))):
            Circle(SKETCH47_R_2)
    extrude(amount=-CUT_EXTRUDE26_DEPTH, mode=Mode.SUBTRACT)

    # Sketch48 → Cut-Extrude27 (cut)
    with BuildSketch(Plane.ZY.offset(-7.5)):
        with Locations((-22.981333294, 52.283628291)):
            Circle(SKETCH48_R)
    extrude(amount=-CUT_EXTRUDE27_DEPTH, mode=Mode.SUBTRACT)

    # Sketch49 → Cut-Extrude28 (cut)
    with BuildSketch(Plane(origin=(45.5, 0, 0), x_dir=(0, 0, -1), z_dir=(1, 0, 0))):
        with Locations((0, 33)):
            Circle(SKETCH49_R)
    extrude(amount=-CUT_EXTRUDE28_DEPTH, mode=Mode.SUBTRACT)

    # Sketch50 → Cut-Extrude29 (cut)
    with BuildSketch(Plane(origin=(45.5, 0, 0), x_dir=(0, 0, -1), z_dir=(1, 0, 0))):
        with Locations((0, 33)):
            Circle(SKETCH50_R)
    extrude(amount=-CUT_EXTRUDE29_DEPTH, mode=Mode.SUBTRACT)

    # Sketch51 → Cut-Extrude30 (cut)
    with BuildSketch(Plane(origin=(11.5, 0, 0), x_dir=(0, 0, -1), z_dir=(1, 0, 0))):
        with Locations((-5, 18.2)):
            Circle(SKETCH51_R)
        with Locations((5, 18.2)):
            Circle(SKETCH51_R)
        with Locations((-5, 67.7)):
            Circle(SKETCH51_R)
        with Locations((5, 67.7)):
            Circle(SKETCH51_R)
    extrude(amount=-CUT_EXTRUDE30_DEPTH, mode=Mode.SUBTRACT)

    # Sketch52 → Cut-Extrude31 (cut, two sides: drawn at the far end of the back side and taken through both)
    with BuildSketch(Plane(origin=(0, 3, 0), x_dir=(1, 0, 0), z_dir=(0, 1, 0)).offset(-CUT_EXTRUDE31_DEPTH_BACK)):
        with BuildLine():
            Line((37.5, 40.495535358), (37.5, -15.495535358))
            ThreePointArc((37.5, -15.495535358), (-6.366648668, 12.5), (37.5, 40.495535358))
        make_face()
    extrude(amount=CUT_EXTRUDE31_DEPTH + CUT_EXTRUDE31_DEPTH_BACK, mode=Mode.SUBTRACT)


with BuildPart() as cut_extrude31_kept_piece:
    # of the separate pieces the step leaves, the one the design keeps (cut_extrude31_pieces_kept)
    add(part.part.solids().sort_by_distance((37.5, 0, 15.495535358))[0])

    # Sketch53 → Cut-Extrude32 (cut)
    with BuildSketch(Plane.ZY.offset(-37.5)):
        with Locations((-30.5, 8)):
            Circle(SKETCH53_R)
        with Locations((-12.5, 8)):
            Circle(SKETCH53_R)
        with Locations((5.5, 8)):
            Circle(SKETCH53_R)
    extrude(amount=-CUT_EXTRUDE32_DEPTH, mode=Mode.SUBTRACT)

    # Sketch54 → Boss-Extrude15 (add)
    # profile 1 of 3: a face of its own
    with BuildSketch(Plane(origin=(45.5, 0, 0), x_dir=(0, 0, -1), z_dir=(1, 0, 0))):
        with Locations((-5.5, 8)):
            Circle(SKETCH54_R)
        with Locations(Location((-5.5, 8, 0), (0, 0, 180))):
            Circle(SKETCH54_R_2, mode=Mode.SUBTRACT)
    # profile 2 of 3: a face of its own
    with BuildSketch(Plane(origin=(45.5, 0, 0), x_dir=(0, 0, -1), z_dir=(1, 0, 0))):
        with Locations((12.5, 8)):
            Circle(SKETCH54_R)
        with Locations(Location((12.5, 8, 0), (0, 0, 180))):
            Circle(SKETCH54_R_2, mode=Mode.SUBTRACT)
    # profile 3 of 3: a face of its own
    with BuildSketch(Plane(origin=(45.5, 0, 0), x_dir=(0, 0, -1), z_dir=(1, 0, 0))):
        with Locations((30.5, 8)):
            Circle(SKETCH54_R)
        with Locations(Location((30.5, 8, 0), (0, 0, 180))):
            Circle(SKETCH54_R_2, mode=Mode.SUBTRACT)
    extrude(amount=BOSS_EXTRUDE15_DEPTH)

    # Sketch55 → Boss-Extrude16 (add)
    with BuildSketch(Plane.XZ):
        with BuildLine():
            Line((37.5, 15.495535358), (37.5, -40.495535358))
            ThreePointArc((37.5, -40.495535358), (55.366648668, -12.5), (37.5, 15.495535358))
        make_face()
        with Locations(Location((49.503562926, -1.573742966, 0), (0, 0, 90))):
            Circle(SKETCH55_R, mode=Mode.SUBTRACT)
        with Locations(Location((51.768190456, -12.352080003, 0), (0, 0, 90))):
            Circle(SKETCH55_R, mode=Mode.SUBTRACT)
        with Locations(Location((49.503562926, -23.13041704, 0), (0, 0, 90))):
            Circle(SKETCH55_R, mode=Mode.SUBTRACT)
    extrude(amount=BOSS_EXTRUDE16_DEPTH)


solid = cut_extrude31_kept_piece.part
